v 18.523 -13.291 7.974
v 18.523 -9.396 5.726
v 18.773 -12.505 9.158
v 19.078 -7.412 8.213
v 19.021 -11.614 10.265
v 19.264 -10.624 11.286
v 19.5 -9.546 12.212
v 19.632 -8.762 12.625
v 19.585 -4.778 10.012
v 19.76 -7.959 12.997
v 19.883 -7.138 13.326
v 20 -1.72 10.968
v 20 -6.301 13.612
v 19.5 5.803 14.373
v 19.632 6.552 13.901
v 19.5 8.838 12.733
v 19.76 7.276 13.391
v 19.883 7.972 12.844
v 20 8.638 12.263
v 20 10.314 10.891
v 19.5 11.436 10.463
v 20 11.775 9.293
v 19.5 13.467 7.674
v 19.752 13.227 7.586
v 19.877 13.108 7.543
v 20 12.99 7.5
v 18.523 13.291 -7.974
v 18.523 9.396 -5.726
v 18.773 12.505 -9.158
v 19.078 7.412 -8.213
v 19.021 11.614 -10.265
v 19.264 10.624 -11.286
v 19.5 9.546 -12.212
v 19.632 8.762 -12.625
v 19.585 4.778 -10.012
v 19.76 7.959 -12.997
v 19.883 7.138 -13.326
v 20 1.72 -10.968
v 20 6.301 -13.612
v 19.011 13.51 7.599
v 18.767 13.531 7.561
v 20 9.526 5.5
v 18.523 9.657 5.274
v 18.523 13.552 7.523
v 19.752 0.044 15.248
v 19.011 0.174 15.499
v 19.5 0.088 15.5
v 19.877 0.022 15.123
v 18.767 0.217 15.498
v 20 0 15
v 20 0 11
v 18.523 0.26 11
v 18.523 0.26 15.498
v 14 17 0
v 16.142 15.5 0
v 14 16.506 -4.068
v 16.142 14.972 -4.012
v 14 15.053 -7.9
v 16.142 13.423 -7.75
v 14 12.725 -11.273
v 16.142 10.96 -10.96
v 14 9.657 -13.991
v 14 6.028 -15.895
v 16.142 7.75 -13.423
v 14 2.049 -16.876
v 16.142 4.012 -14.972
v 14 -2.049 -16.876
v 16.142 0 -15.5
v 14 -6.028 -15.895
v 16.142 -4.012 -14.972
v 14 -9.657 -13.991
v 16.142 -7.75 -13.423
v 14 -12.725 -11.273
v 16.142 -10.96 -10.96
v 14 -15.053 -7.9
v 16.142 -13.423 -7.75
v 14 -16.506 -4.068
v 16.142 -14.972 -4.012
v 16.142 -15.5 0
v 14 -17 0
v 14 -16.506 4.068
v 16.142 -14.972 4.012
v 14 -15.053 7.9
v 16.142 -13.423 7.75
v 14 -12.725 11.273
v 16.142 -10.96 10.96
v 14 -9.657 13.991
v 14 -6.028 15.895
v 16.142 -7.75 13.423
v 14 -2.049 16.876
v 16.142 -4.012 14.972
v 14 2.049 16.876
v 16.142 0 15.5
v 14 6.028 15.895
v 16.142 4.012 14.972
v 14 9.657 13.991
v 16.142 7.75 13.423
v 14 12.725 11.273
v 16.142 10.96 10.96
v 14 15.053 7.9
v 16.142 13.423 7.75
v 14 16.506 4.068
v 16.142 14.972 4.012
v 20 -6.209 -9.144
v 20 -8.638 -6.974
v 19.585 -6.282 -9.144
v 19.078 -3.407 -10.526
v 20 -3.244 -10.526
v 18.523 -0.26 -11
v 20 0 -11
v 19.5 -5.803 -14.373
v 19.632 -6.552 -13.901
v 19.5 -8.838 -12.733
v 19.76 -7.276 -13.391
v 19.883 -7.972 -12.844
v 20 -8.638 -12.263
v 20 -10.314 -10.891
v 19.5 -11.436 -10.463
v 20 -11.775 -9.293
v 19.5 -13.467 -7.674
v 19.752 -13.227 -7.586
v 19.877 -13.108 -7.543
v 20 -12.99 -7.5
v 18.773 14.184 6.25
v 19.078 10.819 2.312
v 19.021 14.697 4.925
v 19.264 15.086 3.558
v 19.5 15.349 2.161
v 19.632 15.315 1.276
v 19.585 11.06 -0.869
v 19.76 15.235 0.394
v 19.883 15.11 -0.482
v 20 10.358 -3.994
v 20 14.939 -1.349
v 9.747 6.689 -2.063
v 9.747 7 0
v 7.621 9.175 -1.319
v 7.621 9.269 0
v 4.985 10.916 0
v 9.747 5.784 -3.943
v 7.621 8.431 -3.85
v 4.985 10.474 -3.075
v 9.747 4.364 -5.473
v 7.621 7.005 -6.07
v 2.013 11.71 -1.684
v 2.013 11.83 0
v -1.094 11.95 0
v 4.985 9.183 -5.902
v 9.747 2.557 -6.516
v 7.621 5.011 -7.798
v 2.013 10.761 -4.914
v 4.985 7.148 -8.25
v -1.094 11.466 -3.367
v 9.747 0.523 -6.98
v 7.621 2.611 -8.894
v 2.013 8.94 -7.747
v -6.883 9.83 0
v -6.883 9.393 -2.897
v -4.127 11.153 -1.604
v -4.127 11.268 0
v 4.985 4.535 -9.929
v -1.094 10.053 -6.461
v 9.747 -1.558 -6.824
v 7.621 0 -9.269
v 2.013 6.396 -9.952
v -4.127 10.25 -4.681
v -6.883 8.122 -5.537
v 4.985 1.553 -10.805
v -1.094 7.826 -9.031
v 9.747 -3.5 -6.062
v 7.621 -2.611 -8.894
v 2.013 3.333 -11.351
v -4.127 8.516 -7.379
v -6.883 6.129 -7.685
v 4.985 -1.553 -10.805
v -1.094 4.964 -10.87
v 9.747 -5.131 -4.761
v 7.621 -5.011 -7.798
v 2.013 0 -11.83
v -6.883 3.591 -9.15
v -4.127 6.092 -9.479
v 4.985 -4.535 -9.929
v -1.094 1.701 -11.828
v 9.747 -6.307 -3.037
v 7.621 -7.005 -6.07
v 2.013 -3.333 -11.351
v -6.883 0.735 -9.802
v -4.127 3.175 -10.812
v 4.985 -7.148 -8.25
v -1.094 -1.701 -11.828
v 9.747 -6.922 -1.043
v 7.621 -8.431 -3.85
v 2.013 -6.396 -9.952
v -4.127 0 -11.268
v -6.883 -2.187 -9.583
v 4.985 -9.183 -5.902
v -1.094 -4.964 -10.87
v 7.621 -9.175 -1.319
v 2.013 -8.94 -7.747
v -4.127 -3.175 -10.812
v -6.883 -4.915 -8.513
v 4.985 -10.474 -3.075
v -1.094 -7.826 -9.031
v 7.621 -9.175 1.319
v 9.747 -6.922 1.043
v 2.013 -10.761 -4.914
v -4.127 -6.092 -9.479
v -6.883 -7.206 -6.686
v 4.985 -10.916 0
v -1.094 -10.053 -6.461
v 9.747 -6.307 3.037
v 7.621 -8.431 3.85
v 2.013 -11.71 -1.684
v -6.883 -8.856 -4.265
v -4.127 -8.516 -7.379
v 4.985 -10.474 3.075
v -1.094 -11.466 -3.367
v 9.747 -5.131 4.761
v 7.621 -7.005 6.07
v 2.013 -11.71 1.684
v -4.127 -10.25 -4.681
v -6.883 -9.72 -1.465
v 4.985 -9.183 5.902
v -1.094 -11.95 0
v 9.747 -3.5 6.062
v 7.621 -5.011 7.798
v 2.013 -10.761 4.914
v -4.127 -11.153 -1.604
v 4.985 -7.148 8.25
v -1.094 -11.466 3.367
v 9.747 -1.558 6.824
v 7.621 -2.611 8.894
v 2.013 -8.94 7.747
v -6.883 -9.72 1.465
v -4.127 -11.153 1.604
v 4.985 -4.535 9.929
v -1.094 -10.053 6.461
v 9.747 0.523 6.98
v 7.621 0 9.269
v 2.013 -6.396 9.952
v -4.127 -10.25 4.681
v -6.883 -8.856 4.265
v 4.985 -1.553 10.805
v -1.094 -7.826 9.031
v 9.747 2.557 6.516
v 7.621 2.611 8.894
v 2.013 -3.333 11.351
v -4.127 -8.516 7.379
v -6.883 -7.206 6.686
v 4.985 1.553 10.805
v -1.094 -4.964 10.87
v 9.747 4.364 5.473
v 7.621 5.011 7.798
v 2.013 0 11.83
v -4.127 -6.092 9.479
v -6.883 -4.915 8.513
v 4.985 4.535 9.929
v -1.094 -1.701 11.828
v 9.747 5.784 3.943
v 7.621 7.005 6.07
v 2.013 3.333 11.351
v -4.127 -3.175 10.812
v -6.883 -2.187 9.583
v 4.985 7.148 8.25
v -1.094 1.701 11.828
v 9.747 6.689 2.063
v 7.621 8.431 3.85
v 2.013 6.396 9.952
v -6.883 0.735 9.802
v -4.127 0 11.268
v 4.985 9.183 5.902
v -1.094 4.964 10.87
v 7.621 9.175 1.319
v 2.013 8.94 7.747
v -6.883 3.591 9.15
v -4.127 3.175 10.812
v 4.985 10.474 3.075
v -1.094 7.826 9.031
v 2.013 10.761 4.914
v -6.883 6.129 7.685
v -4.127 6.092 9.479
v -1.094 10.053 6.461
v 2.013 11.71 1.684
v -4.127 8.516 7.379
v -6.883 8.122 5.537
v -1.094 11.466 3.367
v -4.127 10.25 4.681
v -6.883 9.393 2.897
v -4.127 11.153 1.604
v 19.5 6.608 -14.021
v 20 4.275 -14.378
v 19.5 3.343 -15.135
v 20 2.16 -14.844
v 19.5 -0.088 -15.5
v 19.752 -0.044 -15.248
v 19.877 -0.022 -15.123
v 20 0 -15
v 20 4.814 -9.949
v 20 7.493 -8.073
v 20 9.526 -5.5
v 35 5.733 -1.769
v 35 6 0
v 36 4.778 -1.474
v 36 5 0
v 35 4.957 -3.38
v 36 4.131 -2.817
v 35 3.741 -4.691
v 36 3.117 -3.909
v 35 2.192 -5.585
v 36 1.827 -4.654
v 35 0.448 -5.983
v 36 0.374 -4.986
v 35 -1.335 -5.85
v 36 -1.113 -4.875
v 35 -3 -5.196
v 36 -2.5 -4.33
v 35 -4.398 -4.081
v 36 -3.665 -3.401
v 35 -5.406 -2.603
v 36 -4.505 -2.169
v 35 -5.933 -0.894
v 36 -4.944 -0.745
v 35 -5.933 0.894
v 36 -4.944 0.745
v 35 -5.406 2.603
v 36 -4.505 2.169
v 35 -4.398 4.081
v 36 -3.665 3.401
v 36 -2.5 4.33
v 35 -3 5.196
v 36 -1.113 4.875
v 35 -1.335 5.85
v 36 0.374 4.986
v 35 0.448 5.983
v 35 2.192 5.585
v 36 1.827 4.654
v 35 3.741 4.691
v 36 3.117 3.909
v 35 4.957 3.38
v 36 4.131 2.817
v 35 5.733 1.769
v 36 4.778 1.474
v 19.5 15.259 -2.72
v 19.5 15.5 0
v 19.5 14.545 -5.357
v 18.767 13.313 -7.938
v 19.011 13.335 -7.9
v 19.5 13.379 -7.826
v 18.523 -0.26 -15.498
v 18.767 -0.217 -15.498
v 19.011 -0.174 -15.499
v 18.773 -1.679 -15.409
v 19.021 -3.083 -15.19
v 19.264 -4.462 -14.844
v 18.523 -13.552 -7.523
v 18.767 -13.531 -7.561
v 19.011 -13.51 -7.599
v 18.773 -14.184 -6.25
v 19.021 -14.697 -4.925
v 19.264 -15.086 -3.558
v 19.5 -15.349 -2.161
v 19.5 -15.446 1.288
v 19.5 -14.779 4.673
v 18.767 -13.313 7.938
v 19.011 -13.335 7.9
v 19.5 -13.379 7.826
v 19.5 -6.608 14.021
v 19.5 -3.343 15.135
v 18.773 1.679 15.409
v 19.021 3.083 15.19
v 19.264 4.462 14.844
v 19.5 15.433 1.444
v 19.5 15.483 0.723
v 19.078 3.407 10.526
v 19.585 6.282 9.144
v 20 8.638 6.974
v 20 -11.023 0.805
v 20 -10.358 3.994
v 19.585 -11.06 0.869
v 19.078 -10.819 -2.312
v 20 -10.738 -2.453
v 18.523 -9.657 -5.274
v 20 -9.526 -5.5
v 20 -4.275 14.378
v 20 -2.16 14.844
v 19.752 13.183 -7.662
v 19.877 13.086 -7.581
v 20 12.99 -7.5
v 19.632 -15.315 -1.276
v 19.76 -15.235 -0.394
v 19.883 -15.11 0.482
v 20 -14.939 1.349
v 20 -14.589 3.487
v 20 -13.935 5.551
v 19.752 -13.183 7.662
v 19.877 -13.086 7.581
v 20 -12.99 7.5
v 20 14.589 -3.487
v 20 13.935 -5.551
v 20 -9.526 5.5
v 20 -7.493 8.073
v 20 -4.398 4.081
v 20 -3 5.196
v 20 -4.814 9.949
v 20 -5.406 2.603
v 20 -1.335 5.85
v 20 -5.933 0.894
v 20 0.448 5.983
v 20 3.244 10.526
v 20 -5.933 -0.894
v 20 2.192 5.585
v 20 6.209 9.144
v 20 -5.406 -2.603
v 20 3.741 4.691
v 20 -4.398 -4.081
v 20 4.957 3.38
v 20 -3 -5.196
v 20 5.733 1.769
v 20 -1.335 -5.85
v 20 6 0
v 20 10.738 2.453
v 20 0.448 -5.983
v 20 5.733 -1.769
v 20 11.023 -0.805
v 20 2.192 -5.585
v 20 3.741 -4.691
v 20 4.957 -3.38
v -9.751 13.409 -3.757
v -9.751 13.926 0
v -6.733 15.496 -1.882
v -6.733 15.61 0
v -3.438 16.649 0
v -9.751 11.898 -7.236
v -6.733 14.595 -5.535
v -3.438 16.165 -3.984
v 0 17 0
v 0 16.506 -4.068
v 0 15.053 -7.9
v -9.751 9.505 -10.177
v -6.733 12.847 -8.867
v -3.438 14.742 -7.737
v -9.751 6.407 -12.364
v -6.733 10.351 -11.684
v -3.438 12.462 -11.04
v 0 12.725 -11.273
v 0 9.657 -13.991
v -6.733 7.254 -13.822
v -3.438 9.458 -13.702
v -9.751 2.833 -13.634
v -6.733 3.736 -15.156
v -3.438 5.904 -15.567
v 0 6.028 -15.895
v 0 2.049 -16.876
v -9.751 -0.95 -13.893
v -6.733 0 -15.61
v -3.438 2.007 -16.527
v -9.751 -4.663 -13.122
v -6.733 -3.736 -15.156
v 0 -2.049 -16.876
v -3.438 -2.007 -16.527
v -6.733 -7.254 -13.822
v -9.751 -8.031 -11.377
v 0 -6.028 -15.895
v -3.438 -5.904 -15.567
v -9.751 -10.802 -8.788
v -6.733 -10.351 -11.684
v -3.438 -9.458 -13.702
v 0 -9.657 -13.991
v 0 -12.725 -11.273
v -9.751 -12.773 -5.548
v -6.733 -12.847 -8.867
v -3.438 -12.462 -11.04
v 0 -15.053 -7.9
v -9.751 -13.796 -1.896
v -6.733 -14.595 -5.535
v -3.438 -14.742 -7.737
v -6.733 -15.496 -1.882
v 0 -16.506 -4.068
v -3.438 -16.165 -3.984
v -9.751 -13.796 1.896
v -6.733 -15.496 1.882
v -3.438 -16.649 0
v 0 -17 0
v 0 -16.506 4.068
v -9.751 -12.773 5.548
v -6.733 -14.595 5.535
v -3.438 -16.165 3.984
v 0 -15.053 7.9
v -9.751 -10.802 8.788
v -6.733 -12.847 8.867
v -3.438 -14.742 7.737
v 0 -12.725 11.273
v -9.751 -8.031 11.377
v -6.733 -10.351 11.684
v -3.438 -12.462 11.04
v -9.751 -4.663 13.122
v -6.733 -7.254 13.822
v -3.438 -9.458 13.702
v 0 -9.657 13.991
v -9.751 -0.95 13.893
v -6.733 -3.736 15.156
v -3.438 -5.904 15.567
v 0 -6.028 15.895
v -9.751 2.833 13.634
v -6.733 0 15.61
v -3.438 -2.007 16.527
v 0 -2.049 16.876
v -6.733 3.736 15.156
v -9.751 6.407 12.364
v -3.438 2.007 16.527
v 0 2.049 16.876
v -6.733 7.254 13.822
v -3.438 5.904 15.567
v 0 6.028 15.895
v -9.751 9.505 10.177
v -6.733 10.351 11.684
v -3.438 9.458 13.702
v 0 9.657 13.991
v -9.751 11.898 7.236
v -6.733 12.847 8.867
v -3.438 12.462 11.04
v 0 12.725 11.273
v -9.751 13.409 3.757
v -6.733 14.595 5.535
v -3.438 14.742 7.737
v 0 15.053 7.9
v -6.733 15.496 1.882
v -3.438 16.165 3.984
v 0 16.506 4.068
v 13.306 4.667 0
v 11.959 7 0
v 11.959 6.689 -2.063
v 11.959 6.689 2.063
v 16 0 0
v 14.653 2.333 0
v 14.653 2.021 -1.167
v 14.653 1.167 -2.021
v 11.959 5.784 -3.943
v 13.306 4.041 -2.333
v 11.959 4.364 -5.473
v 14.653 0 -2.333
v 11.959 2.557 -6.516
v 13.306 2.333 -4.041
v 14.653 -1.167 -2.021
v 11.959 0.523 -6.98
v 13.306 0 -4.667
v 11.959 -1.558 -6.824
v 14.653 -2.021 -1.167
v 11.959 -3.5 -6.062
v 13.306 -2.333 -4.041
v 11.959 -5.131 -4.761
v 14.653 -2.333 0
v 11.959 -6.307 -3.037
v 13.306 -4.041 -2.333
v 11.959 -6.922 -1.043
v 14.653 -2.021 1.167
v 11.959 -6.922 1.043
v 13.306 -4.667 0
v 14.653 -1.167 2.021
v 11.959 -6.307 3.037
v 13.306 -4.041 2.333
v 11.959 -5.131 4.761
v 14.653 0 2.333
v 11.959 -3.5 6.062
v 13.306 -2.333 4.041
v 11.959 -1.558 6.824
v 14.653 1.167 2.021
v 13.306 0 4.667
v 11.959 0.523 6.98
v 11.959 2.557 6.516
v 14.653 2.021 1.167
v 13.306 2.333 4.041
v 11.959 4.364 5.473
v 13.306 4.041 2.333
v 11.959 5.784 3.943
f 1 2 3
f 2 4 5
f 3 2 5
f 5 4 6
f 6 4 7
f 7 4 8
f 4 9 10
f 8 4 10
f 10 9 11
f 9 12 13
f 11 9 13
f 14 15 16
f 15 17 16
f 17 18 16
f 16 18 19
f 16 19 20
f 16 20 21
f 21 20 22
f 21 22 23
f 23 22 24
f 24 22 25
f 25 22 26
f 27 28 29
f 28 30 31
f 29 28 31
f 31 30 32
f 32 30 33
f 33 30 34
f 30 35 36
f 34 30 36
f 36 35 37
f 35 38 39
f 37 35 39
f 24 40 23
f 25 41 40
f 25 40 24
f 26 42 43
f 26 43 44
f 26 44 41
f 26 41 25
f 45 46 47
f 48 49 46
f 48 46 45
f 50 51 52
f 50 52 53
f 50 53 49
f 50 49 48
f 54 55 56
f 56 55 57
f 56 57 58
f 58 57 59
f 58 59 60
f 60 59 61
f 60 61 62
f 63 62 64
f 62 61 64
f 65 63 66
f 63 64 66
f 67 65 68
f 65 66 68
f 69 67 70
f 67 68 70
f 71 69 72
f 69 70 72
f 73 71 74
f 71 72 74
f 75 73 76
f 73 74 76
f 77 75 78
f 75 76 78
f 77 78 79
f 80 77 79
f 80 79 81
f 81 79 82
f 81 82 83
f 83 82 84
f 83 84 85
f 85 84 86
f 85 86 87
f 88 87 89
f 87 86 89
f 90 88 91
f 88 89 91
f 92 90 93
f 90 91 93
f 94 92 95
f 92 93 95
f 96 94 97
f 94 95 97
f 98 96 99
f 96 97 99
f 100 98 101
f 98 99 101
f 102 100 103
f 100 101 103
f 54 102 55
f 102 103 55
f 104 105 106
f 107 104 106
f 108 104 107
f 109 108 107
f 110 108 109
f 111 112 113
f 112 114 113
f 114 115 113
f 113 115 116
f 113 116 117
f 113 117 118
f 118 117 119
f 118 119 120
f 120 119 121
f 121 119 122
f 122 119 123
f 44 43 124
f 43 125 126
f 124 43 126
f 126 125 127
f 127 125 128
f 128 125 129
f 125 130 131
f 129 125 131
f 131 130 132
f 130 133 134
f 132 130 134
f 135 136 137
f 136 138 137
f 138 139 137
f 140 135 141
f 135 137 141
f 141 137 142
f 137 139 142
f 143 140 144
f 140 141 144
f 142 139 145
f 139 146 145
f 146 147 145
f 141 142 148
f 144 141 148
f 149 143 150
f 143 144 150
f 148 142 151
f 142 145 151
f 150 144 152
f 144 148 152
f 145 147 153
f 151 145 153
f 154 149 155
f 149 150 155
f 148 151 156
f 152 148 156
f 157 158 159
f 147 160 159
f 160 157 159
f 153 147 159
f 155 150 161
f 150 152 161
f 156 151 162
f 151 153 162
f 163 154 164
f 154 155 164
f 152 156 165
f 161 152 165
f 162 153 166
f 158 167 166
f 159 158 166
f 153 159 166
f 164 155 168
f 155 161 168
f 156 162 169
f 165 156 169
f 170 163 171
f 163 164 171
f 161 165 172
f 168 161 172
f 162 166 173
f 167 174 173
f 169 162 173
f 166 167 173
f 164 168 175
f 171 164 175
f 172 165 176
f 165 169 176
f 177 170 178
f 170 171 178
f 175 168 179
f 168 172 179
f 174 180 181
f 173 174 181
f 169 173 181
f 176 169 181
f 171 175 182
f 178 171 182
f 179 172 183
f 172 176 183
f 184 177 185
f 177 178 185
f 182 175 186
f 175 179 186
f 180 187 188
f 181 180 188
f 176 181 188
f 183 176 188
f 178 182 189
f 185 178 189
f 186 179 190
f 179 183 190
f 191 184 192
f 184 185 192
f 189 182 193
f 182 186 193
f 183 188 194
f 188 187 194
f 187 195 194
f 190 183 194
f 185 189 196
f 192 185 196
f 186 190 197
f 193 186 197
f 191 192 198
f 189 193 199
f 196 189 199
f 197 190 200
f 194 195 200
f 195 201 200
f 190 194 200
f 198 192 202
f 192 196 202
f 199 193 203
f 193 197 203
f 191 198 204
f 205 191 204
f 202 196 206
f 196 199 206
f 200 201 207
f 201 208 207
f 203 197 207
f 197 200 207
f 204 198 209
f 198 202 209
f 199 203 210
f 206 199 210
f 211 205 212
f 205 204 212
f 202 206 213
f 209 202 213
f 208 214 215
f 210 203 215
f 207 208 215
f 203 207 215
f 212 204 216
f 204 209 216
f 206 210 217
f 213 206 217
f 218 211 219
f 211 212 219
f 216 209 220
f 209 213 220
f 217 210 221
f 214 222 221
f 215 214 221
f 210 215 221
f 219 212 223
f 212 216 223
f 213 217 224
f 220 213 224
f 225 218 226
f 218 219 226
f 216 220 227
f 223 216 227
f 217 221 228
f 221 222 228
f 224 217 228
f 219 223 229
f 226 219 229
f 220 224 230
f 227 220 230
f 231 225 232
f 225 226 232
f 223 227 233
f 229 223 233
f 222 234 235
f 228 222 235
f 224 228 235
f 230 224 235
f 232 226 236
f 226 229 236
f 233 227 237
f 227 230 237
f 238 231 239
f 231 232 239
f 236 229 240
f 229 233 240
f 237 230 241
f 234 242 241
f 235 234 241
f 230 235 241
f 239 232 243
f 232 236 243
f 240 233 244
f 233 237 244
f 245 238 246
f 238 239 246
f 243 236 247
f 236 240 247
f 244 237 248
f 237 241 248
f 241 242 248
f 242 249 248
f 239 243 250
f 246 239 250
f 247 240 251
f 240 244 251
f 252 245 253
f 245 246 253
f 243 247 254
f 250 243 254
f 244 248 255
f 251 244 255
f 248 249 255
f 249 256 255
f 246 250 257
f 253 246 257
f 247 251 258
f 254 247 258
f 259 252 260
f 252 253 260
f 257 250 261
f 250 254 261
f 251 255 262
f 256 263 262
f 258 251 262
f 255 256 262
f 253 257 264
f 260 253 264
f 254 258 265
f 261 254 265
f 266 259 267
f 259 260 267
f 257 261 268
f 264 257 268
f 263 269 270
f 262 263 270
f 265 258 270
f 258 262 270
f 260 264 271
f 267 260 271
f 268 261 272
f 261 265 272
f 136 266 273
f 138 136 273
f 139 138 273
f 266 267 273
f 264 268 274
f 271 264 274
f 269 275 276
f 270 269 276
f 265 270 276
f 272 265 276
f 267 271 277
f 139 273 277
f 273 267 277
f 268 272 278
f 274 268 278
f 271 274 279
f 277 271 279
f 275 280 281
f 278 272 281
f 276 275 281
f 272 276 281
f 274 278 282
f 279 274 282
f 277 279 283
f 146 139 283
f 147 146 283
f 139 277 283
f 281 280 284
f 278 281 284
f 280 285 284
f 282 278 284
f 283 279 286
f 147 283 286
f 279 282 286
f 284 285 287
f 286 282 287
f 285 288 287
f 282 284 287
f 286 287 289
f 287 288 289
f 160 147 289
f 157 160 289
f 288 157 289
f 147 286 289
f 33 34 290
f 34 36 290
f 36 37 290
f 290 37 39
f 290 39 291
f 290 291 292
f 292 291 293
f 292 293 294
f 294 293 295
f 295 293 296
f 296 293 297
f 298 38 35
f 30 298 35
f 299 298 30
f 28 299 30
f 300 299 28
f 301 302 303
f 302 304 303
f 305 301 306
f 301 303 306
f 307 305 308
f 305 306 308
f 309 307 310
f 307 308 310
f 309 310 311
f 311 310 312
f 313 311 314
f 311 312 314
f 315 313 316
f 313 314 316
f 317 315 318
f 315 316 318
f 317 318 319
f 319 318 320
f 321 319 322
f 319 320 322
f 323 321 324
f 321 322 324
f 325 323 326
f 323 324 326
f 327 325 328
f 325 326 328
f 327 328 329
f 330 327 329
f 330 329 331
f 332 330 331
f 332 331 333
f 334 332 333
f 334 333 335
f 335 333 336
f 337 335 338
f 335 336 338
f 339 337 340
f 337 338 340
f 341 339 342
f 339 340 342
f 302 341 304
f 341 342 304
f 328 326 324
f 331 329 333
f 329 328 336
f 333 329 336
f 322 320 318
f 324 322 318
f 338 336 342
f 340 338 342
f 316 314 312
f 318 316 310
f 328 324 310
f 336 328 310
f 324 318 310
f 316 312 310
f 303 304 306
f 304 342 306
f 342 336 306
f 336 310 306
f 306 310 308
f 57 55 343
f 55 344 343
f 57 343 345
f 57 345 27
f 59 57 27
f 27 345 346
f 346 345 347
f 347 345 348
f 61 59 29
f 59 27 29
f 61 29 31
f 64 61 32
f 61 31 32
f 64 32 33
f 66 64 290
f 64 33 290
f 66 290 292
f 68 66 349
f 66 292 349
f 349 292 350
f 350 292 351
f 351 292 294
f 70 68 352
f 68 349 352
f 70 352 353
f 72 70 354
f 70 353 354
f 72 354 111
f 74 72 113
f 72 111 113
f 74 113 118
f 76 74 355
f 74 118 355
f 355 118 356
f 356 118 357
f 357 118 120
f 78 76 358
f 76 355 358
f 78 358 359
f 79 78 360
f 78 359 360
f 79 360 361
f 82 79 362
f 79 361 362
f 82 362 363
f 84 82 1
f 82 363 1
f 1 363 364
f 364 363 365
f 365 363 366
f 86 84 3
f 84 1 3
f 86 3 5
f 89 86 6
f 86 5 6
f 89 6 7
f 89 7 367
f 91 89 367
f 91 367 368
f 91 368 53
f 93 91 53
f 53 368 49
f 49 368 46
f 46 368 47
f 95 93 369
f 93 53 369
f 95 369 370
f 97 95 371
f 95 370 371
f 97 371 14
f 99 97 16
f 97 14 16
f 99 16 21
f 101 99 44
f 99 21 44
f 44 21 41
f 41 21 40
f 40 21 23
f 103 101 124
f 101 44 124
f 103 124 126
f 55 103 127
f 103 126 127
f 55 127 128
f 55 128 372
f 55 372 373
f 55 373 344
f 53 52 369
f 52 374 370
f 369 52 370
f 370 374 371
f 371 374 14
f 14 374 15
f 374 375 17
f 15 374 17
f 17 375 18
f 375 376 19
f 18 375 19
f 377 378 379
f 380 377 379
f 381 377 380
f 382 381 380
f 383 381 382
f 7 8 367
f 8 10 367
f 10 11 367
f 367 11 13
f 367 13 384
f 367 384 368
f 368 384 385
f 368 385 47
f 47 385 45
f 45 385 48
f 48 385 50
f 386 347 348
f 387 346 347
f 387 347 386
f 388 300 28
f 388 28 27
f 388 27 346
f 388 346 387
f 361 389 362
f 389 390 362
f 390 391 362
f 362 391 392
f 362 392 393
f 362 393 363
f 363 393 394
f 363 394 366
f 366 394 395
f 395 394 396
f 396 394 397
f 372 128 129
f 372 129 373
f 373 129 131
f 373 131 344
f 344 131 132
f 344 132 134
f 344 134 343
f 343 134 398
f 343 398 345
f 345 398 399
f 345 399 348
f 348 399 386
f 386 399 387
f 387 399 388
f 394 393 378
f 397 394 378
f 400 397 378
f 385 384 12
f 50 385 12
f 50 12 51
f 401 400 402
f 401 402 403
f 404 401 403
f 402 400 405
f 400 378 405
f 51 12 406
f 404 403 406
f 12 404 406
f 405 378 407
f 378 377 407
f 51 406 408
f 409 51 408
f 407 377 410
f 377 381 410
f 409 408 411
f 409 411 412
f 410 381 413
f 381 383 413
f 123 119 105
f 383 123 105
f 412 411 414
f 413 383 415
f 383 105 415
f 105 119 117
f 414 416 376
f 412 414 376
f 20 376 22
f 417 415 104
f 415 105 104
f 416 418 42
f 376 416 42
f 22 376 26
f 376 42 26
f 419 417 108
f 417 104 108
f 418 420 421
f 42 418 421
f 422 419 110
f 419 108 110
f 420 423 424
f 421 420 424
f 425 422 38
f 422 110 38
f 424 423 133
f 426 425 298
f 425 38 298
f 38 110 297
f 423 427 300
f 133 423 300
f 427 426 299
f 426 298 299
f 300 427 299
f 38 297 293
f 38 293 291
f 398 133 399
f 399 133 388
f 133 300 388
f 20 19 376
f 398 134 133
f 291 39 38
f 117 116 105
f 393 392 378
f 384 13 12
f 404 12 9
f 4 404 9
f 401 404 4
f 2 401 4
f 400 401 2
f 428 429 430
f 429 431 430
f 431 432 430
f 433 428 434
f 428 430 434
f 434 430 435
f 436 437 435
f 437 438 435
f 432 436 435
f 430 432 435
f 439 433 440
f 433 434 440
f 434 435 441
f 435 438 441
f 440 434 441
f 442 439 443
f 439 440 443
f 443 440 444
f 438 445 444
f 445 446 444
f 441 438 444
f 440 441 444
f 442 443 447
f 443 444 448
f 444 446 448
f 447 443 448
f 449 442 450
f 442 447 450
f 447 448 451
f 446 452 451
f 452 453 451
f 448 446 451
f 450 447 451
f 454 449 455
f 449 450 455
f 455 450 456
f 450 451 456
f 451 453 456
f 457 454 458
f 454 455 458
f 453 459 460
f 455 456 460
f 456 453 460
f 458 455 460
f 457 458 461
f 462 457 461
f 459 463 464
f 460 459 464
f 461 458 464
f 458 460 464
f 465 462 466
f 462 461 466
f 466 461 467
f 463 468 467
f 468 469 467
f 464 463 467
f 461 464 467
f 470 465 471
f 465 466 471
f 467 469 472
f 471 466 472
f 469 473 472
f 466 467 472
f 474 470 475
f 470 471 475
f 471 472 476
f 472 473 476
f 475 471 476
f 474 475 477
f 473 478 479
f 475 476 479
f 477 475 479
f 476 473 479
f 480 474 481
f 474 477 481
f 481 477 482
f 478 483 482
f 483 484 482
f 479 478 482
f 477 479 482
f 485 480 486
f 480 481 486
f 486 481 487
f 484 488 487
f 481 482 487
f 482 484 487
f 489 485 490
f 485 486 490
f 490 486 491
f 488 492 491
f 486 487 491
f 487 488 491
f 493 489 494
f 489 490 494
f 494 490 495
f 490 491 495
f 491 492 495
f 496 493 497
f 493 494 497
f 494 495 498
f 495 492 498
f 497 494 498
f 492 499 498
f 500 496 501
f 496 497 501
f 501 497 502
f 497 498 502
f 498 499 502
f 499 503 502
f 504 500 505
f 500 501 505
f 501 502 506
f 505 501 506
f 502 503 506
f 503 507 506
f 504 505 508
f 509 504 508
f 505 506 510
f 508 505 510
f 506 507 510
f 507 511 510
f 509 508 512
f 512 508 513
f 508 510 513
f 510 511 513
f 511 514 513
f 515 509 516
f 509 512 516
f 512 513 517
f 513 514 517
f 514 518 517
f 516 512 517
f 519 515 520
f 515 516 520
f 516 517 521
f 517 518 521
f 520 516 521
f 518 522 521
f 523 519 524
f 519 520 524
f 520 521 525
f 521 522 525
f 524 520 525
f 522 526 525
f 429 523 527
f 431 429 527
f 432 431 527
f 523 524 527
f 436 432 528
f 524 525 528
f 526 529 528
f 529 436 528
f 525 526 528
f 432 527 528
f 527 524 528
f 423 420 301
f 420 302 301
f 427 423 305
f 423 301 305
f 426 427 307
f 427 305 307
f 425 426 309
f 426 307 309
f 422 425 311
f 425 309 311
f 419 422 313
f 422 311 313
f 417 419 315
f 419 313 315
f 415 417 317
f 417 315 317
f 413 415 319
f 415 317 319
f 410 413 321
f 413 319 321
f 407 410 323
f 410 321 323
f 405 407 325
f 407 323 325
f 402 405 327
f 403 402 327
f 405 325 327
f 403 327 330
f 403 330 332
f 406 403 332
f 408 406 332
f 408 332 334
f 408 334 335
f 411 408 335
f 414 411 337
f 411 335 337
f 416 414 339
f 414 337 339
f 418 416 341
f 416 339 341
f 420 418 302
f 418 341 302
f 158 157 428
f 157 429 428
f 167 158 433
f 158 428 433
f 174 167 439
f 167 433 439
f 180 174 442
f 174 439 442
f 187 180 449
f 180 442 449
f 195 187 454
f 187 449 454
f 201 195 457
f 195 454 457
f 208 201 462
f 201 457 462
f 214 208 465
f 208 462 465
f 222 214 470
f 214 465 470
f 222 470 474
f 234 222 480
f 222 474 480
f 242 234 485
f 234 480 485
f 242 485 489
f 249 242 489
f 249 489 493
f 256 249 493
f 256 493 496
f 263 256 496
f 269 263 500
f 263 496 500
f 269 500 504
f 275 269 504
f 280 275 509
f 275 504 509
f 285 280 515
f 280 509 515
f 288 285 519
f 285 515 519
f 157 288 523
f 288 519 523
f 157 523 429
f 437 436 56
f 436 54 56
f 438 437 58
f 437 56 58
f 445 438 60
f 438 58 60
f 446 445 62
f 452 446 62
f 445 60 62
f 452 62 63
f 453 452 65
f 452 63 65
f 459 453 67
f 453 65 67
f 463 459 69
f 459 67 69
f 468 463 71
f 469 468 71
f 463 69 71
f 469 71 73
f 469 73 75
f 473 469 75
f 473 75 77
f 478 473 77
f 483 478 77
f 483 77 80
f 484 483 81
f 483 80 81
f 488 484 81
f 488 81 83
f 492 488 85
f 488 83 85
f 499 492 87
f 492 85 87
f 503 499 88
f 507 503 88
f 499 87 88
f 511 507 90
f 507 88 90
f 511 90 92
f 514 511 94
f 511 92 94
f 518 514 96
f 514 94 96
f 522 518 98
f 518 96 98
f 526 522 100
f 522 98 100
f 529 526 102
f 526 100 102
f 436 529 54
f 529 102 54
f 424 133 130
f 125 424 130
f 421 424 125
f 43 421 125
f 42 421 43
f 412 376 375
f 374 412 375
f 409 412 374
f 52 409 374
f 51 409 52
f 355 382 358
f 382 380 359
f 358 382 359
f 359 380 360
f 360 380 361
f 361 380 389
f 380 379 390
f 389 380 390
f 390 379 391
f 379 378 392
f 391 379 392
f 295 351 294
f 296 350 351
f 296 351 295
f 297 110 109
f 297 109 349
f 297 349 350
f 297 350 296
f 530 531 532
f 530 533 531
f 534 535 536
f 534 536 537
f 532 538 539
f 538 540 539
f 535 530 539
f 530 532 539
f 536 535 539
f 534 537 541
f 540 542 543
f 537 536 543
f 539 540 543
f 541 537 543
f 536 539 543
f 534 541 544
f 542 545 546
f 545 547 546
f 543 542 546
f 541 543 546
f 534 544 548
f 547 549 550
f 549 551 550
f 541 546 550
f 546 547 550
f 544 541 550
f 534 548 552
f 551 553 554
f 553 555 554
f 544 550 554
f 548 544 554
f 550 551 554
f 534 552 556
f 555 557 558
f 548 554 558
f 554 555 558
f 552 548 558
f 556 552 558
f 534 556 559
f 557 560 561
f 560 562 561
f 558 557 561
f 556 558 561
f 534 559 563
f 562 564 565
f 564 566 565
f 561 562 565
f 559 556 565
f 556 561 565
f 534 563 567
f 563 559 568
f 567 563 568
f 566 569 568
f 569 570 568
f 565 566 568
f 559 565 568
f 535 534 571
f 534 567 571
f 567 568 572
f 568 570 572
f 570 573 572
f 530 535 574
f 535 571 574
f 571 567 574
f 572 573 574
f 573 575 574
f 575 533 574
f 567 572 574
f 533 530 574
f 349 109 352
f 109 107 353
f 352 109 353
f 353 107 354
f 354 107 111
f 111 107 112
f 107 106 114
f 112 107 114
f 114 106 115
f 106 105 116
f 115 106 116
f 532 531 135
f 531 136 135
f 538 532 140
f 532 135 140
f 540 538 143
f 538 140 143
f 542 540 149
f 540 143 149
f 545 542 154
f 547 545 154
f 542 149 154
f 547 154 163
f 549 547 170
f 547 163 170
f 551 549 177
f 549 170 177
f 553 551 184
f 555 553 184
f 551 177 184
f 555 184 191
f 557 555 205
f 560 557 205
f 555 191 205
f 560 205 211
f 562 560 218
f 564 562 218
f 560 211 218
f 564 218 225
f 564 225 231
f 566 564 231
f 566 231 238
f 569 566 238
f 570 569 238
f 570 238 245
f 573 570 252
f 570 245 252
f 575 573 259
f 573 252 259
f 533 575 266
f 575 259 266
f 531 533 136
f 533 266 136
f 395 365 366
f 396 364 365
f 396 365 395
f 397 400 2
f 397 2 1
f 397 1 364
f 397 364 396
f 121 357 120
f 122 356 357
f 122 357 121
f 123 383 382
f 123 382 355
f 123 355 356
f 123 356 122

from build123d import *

# Parameters (mm, degrees)
ENL_V_MAT_EXTRU_1_DEPTH      = 1.5
R_P_TITION_CIRCULAIRE1_COUNT = 6


with BuildPart() as part:
    # Esquisse1 → Base-Révolution (revolve)
    with BuildSketch(Plane.XY):
        with BuildLine():
            Line((0, 17), (14, 17))
            Line((14, 17), (16.14222201, 15.5))
            Line((16.14222201, 15.5), (19.5, 15.5))
            Line((19.5, 15.5), (20, 15))
            Line((20, 15), (20, 6))
            Line((20, 6), (35, 6))
            Line((35, 6), (36, 5))
            Line((36, 5), (36, 0))
            Line((36, 0), (16, 0))
            Line((16, 0), (11.958548116, 7))
            Line((11.958548116, 7), (9.746794345, 7))
            ThreePointArc((9.746794345, 7), (2.013063522, 11.829944009), (-6.882917236, 9.829824531))
            Line((-6.882917236, 9.829824531), (-9.750799418, 13.925584753))
            ThreePointArc((-9.750799418, 13.925584753), (-5.111998592, 16.213188163), (0, 17))
        make_face()
    revolve(axis=Axis((94.383348317, 0, 0), (-1, 0, 0)))

    # Esquisse3 → Enlèv. mat.-Extru.1 (cut)
    with BuildSketch(Plane(origin=(19.396926208, -3.420201433, 0), x_dir=(0, 0, -1), z_dir=(0.9848077530122081, -0.1736481776669306, 0))):
        with BuildLine():
            Line((-11, 3.472963553), (-18.209947962, 3.472963553))
            ThreePointArc((-18.209947962, 3.472963553), (-15.606207956, 12.856378604), (-8.539576778, 19.556428144))
            Line((-8.539576778, 19.556428144), (-5.158463097, 13.188428466))
            ThreePointArc((-5.158463097, 13.188428466), (-9.42717068, 9.141160177), (-11, 3.472963553))
        make_face()
    enl_v_mat_extru_1 = extrude(amount=-ENL_V_MAT_EXTRU_1_DEPTH, mode=Mode.SUBTRACT)

    # Répétition circulaire1: Enlèv. mat.-Extru.1 ×6 about axis
    r_p_tition_circulaire1_axis = Axis((94.383348317, 0, 0), (-1, 0, 0))
    for i in range(1, R_P_TITION_CIRCULAIRE1_COUNT):
        add(enl_v_mat_extru_1.rotate(r_p_tition_circulaire1_axis, i * 360 / R_P_TITION_CIRCULAIRE1_COUNT), mode=Mode.SUBTRACT)


solid = part.part
